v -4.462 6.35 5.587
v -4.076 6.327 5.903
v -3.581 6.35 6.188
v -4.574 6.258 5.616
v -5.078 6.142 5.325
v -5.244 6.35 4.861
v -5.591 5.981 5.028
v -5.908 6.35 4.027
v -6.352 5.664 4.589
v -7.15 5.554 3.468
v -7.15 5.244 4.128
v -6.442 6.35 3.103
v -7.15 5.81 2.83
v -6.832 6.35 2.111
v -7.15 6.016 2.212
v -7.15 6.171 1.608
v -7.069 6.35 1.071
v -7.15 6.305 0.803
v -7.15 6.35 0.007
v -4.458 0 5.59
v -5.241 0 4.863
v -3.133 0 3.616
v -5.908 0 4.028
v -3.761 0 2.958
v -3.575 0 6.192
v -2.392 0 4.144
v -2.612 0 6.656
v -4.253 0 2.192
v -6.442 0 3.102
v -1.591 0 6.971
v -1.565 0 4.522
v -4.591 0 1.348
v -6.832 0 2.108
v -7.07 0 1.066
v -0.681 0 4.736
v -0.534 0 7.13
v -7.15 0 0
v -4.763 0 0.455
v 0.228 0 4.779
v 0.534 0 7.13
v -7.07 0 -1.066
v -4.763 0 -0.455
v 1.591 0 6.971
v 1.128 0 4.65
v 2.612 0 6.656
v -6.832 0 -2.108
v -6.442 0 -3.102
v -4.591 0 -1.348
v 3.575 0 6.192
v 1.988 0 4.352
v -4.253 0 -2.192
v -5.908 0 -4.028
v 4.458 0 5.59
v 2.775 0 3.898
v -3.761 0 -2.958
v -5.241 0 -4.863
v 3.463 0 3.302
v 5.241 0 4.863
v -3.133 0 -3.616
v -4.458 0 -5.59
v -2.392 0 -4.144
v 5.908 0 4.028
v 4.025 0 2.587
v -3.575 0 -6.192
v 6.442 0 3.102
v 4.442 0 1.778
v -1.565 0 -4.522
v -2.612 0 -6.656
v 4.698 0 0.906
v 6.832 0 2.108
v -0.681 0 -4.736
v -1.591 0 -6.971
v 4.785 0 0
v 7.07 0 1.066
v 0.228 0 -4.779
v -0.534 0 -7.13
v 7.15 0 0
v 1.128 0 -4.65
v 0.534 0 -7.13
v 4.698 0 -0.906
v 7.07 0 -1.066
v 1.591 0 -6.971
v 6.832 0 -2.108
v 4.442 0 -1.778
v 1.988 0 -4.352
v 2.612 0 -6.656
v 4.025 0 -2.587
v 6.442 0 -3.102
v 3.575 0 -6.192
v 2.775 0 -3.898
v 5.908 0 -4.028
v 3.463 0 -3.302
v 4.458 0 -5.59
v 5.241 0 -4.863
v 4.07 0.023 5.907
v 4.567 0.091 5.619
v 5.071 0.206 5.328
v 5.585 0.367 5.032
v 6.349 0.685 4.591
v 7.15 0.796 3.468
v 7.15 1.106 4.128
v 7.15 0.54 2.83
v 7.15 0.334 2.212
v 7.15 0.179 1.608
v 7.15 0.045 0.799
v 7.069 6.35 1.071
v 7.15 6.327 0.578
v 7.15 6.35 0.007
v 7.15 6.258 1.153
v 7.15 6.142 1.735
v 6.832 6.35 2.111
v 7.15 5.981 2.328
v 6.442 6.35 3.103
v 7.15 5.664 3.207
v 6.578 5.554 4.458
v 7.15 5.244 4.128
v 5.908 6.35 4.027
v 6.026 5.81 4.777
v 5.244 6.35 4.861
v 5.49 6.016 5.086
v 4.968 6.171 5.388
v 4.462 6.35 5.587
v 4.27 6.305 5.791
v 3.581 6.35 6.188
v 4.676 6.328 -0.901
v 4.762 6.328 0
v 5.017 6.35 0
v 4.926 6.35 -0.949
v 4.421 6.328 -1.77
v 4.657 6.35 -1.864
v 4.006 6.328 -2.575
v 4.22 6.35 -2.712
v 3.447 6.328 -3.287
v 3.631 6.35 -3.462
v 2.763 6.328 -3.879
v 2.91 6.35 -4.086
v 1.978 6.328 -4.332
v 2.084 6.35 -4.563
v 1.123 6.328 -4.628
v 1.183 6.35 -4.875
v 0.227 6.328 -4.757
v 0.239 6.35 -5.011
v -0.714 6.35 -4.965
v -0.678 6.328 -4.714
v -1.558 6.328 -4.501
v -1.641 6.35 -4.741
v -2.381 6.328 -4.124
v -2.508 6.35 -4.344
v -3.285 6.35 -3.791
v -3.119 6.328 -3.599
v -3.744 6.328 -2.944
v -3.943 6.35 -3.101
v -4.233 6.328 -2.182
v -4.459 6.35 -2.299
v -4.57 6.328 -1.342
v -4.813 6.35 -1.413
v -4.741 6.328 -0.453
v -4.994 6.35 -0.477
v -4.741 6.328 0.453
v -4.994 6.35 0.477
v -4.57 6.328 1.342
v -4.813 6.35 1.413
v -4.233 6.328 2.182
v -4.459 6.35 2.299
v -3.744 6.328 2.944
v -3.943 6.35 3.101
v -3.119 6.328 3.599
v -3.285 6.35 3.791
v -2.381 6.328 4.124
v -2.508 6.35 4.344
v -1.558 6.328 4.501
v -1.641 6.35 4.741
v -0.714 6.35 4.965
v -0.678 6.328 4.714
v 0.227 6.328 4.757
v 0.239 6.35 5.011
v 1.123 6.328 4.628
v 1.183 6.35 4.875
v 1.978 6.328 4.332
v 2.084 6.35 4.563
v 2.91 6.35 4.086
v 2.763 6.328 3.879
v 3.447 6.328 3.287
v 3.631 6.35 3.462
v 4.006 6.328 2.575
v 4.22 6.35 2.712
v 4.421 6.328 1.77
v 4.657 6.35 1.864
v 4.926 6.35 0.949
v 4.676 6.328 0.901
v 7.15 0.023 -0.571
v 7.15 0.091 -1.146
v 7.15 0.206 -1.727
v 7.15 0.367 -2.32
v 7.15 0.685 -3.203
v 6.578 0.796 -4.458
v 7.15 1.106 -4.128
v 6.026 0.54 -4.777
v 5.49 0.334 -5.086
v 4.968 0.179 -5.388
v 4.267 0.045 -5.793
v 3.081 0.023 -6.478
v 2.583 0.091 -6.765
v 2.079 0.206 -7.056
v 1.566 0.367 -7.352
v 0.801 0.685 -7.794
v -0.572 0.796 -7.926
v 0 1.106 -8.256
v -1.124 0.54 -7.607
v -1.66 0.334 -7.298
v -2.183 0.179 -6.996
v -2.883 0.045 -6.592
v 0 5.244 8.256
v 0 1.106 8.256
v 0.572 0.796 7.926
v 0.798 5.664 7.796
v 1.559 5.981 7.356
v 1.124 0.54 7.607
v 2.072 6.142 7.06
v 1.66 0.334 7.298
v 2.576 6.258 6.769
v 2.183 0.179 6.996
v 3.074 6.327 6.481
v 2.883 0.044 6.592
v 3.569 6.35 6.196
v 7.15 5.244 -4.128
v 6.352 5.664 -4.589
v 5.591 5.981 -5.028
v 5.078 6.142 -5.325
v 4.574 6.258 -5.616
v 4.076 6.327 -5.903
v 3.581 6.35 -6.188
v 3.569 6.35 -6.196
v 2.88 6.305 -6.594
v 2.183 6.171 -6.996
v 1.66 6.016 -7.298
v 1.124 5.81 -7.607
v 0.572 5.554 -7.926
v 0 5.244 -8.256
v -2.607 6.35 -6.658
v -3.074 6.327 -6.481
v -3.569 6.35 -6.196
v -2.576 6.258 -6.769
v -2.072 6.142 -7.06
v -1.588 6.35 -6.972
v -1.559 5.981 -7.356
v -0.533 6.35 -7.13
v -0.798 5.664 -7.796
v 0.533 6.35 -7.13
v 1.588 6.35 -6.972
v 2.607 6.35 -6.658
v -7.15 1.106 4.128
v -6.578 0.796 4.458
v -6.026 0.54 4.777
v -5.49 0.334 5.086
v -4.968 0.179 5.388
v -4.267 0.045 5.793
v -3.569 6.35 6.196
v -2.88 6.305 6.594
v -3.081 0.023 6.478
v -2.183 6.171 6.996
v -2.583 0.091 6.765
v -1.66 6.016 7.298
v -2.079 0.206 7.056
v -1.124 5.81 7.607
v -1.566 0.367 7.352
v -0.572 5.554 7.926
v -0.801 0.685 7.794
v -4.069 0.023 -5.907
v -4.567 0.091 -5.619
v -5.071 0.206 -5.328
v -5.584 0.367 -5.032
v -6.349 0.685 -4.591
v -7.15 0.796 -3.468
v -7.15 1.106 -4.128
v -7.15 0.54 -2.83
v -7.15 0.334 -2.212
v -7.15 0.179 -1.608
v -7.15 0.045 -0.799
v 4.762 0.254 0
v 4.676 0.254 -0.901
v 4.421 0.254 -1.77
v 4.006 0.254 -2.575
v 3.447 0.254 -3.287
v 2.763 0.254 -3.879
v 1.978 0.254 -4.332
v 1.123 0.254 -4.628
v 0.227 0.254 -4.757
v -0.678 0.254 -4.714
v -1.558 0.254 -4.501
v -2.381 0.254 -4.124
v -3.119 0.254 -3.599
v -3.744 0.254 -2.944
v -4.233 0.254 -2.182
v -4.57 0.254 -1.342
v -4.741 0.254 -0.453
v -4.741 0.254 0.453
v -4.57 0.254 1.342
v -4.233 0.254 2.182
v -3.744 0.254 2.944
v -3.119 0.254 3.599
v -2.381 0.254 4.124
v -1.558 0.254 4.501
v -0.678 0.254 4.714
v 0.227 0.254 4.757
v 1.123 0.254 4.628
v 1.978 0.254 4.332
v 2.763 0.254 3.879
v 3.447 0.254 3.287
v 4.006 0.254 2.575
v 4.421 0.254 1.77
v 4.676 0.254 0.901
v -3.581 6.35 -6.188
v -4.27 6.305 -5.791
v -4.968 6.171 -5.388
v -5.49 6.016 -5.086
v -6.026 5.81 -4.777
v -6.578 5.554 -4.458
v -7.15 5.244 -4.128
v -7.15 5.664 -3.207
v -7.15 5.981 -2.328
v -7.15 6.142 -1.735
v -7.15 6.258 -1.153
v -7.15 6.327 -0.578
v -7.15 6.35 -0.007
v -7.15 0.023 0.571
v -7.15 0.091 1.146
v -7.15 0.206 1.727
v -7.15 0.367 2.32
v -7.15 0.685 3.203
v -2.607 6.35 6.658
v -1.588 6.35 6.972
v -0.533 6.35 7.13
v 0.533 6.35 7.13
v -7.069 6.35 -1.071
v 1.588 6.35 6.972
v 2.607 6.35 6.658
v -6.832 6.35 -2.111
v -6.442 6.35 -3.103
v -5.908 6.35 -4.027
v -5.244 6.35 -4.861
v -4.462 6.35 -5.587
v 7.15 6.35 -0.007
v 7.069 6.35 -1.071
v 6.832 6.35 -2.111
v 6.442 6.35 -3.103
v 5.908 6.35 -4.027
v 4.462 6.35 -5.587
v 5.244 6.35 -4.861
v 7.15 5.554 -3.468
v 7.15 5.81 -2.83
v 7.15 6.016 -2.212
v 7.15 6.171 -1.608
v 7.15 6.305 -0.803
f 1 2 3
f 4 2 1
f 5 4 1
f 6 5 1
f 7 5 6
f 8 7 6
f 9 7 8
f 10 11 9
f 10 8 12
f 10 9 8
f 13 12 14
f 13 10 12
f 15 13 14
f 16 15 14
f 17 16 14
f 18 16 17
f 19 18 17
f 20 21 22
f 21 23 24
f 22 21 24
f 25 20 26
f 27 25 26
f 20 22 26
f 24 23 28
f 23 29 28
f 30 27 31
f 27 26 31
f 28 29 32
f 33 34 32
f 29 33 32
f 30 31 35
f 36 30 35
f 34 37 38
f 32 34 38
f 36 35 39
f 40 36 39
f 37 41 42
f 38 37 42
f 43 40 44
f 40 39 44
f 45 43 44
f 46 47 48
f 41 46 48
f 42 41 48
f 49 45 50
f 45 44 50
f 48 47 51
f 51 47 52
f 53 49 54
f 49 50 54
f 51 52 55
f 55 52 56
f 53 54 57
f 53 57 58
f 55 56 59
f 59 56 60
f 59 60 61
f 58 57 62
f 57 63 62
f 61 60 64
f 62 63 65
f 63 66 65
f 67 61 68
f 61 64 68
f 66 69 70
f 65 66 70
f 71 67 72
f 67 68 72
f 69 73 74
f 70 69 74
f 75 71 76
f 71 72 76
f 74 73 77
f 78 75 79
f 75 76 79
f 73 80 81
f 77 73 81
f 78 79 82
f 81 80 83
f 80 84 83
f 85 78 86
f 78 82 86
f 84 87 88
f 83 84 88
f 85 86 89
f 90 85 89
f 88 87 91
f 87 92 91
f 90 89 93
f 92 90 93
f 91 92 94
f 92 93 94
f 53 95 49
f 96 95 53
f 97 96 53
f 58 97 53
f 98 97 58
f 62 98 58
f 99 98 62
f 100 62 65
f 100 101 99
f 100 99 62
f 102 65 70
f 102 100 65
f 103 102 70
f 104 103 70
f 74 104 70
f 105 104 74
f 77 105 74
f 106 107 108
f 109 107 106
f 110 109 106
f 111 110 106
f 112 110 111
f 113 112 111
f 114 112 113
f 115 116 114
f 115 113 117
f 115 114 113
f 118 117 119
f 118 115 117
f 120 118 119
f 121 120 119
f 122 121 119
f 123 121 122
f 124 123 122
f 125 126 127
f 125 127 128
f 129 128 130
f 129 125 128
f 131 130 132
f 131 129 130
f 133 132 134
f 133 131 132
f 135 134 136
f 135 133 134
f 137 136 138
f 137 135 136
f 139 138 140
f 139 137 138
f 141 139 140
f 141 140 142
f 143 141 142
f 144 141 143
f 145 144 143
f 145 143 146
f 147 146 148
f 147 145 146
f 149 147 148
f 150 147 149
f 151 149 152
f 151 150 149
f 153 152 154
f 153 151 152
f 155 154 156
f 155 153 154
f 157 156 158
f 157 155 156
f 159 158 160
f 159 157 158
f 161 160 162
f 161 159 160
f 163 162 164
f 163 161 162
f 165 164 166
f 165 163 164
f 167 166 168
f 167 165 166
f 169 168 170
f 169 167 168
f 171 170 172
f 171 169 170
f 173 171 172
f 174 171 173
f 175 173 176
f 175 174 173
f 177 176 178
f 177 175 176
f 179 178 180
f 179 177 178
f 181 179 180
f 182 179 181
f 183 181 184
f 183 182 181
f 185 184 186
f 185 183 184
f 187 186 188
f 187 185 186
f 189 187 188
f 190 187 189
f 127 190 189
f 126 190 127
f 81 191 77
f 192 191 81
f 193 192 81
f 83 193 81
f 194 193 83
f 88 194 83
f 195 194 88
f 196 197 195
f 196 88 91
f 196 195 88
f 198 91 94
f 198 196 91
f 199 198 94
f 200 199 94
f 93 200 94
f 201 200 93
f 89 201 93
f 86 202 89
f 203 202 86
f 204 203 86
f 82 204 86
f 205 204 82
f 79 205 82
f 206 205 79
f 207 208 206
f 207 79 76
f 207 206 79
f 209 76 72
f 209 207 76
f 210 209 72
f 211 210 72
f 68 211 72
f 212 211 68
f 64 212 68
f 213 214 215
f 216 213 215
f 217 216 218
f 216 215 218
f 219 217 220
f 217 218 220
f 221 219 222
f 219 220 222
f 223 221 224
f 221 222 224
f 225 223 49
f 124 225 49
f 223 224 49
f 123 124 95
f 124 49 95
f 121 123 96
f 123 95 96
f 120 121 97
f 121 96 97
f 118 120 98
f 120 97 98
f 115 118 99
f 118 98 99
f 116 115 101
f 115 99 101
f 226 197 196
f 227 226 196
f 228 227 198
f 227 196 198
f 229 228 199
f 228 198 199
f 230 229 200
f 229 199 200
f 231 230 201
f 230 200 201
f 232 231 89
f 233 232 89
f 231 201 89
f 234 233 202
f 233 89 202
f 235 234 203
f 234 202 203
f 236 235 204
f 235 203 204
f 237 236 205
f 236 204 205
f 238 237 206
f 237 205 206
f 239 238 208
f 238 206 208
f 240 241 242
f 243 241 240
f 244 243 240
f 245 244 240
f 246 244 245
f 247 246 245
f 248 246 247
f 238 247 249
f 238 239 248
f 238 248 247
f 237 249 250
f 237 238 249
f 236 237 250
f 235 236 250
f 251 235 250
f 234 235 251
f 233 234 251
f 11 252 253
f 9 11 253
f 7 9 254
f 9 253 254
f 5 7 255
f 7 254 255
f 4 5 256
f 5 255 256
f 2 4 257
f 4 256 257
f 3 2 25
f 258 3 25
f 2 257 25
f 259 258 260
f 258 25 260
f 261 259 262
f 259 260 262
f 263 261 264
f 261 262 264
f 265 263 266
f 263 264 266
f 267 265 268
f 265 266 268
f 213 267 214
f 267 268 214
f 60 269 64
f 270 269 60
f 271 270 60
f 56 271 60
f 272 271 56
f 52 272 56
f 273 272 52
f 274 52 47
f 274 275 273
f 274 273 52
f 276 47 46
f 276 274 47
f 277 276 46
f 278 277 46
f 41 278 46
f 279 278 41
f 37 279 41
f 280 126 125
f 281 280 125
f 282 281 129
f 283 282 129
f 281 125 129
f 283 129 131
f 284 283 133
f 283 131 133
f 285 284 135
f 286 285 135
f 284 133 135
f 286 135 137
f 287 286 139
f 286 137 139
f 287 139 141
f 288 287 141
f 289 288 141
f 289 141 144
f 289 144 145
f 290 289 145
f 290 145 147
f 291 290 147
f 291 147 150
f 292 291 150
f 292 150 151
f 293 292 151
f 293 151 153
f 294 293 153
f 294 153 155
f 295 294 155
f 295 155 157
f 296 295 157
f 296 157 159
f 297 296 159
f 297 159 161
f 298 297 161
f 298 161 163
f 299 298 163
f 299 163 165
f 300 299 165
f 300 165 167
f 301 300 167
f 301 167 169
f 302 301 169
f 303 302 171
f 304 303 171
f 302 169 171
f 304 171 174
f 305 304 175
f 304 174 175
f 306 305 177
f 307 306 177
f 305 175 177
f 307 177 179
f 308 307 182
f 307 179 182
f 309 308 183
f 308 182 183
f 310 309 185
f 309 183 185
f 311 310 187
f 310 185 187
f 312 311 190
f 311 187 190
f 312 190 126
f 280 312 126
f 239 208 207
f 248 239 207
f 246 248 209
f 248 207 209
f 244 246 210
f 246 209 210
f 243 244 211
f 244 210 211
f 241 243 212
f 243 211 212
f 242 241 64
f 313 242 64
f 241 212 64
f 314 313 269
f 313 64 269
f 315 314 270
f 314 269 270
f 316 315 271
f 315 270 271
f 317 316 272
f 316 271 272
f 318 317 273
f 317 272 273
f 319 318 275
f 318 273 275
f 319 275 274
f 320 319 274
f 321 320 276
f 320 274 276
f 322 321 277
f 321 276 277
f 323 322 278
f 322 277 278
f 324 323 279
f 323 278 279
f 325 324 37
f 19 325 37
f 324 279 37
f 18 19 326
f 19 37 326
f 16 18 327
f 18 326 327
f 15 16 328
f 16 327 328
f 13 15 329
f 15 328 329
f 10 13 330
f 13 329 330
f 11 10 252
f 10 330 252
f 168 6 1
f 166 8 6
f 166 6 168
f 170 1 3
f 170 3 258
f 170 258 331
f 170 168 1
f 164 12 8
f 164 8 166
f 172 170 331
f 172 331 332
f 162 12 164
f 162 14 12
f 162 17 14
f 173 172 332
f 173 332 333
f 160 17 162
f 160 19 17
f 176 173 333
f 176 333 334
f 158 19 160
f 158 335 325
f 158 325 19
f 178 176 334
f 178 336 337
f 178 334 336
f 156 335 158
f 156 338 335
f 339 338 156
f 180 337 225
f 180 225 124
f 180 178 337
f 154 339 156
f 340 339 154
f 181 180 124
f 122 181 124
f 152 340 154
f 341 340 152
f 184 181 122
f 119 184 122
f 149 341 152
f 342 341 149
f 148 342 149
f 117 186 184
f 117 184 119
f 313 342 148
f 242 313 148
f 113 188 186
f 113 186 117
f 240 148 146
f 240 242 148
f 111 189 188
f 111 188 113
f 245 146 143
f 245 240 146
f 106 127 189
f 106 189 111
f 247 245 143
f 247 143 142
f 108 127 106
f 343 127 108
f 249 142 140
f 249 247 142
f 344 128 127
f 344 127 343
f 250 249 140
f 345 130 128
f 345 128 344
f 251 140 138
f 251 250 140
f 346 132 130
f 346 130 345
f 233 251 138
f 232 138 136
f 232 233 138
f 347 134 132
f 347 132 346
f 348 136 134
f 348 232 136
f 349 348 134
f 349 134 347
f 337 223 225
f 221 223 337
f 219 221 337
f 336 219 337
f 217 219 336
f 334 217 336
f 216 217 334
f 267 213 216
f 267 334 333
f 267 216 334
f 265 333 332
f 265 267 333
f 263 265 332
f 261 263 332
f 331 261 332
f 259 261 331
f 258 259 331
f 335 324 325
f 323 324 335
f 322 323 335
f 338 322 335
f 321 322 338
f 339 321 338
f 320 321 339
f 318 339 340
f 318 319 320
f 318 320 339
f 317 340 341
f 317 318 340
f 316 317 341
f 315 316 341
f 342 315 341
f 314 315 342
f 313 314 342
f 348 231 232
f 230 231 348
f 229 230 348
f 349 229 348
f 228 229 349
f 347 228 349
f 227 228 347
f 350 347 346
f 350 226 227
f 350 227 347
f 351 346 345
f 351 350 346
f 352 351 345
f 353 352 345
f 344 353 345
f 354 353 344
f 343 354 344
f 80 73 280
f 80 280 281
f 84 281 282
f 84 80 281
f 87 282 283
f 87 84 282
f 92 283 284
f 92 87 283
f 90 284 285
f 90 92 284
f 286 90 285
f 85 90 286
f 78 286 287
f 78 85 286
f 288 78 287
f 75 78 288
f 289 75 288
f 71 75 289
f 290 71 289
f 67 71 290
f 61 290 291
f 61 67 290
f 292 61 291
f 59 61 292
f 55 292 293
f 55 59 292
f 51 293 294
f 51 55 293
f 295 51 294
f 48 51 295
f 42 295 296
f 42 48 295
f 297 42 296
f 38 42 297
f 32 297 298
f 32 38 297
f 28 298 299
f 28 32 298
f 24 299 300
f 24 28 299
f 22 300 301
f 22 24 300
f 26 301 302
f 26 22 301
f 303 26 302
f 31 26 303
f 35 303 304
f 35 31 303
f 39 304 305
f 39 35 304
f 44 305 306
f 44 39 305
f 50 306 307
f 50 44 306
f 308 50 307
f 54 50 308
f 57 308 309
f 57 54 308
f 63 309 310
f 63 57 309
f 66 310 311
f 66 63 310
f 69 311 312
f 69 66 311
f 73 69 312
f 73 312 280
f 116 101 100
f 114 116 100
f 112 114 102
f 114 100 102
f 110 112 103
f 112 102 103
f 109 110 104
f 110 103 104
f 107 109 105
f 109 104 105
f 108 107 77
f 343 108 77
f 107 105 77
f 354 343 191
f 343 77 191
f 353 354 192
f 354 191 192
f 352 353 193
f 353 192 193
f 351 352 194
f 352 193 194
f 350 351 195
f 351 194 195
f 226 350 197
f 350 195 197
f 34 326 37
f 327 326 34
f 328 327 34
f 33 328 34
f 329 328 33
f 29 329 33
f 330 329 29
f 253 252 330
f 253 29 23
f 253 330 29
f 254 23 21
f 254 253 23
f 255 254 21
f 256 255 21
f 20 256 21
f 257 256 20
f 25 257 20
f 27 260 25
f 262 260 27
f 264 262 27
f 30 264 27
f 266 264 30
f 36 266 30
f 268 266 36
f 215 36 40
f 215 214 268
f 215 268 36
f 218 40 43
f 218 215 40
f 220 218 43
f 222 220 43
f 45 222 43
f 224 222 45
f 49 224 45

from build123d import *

# Parameters (mm, degrees)
BOSS_EXTRUDE1_DEPTH = 6.35
SKETCH2_R           = 4.7625
CUT_EXTRUDE1_DEPTH  = 7.35
CHAMFER2_SIZE       = 0.254
CHAMFER2_SIZE2      = 0.022222121
CHAMFER3_SIZE       = 0.254
CHAMFER3_SIZE2      = 0.022222121
SKETCH3_OUTSIDE_W   = 33.55
SKETCH3_OUTSIDE_H   = 35.762
SKETCH3_OUTSIDE_R   = 7.150103868
CUT_EXTRUDE2_DEPTH  = 6.35
CUT_EXTRUDE2_TAPER  = 45
SKETCH4_OUTSIDE_W   = 33.55
SKETCH4_OUTSIDE_H   = 35.762
SKETCH4_OUTSIDE_R   = 7.1501
CUT_EXTRUDE3_DEPTH  = 6.35
CUT_EXTRUDE3_TAPER  = 45


with BuildPart() as part:
    # Sketch1 → Boss-Extrude1 (new body)
    with BuildSketch(Plane(origin=(0, 0, 0), x_dir=(1, 0, 0), z_dir=(0, 1, 0))):
        Polygon((0, 8.256224319), (-7.1501, 4.12811216), (-7.1501, -4.12811216), (0, -8.256224319), (7.1501, -4.12811216), (7.1501, 4.12811216), align=None)
    extrude(amount=BOSS_EXTRUDE1_DEPTH)

    # Sketch2 → Cut-Extrude1 (cut, through all)
    with BuildSketch(Plane(origin=(0, 6.35, 0), x_dir=(1, 0, 0), z_dir=(0, 1, 0))):
        Circle(SKETCH2_R)
    extrude(amount=-CUT_EXTRUDE1_DEPTH, mode=Mode.SUBTRACT)

    # Chamfer2
    chamfer2_edges = [part.edges().sort_by_distance(p)[0] for p in [
        (-4.7625, 6.35, 0),
    ]]
    chamfer2_side = [part.faces().sort_by_distance(p)[0] for p in [
        (-3.465830418, 6.35, -6.002994375),
    ]]
    chamfer(chamfer2_edges, length=CHAMFER2_SIZE, length2=CHAMFER2_SIZE2, reference=chamfer2_side[0])

    # Chamfer3
    chamfer3_edges = [part.edges().sort_by_distance(p)[0] for p in [
        (-4.7625, 0, 0),
    ]]
    chamfer3_side = [part.faces().sort_by_distance(p)[0] for p in [
        (-4.7625, 3.16388894, 0),
    ]]
    chamfer(chamfer3_edges, length=CHAMFER3_SIZE, length2=CHAMFER3_SIZE2, reference=chamfer3_side[0])

    # Sketch3 outside → Cut-Extrude2 (cut)
    with BuildSketch(Plane(origin=(0, 6.35, 0), x_dir=(1, 0, 0), z_dir=(0, 1, 0))):
        Rectangle(SKETCH3_OUTSIDE_W, SKETCH3_OUTSIDE_H)
        Circle(SKETCH3_OUTSIDE_R, mode=Mode.SUBTRACT)
    extrude(amount=-CUT_EXTRUDE2_DEPTH, taper=CUT_EXTRUDE2_TAPER, mode=Mode.SUBTRACT)

    # Sketch4 outside → Cut-Extrude3 (cut)
    with BuildSketch(Plane.XZ):
        Rectangle(SKETCH4_OUTSIDE_W, SKETCH4_OUTSIDE_H)
        Circle(SKETCH4_OUTSIDE_R, mode=Mode.SUBTRACT)
    extrude(amount=-CUT_EXTRUDE3_DEPTH, taper=CUT_EXTRUDE3_TAPER, mode=Mode.SUBTRACT)


solid = part.part
